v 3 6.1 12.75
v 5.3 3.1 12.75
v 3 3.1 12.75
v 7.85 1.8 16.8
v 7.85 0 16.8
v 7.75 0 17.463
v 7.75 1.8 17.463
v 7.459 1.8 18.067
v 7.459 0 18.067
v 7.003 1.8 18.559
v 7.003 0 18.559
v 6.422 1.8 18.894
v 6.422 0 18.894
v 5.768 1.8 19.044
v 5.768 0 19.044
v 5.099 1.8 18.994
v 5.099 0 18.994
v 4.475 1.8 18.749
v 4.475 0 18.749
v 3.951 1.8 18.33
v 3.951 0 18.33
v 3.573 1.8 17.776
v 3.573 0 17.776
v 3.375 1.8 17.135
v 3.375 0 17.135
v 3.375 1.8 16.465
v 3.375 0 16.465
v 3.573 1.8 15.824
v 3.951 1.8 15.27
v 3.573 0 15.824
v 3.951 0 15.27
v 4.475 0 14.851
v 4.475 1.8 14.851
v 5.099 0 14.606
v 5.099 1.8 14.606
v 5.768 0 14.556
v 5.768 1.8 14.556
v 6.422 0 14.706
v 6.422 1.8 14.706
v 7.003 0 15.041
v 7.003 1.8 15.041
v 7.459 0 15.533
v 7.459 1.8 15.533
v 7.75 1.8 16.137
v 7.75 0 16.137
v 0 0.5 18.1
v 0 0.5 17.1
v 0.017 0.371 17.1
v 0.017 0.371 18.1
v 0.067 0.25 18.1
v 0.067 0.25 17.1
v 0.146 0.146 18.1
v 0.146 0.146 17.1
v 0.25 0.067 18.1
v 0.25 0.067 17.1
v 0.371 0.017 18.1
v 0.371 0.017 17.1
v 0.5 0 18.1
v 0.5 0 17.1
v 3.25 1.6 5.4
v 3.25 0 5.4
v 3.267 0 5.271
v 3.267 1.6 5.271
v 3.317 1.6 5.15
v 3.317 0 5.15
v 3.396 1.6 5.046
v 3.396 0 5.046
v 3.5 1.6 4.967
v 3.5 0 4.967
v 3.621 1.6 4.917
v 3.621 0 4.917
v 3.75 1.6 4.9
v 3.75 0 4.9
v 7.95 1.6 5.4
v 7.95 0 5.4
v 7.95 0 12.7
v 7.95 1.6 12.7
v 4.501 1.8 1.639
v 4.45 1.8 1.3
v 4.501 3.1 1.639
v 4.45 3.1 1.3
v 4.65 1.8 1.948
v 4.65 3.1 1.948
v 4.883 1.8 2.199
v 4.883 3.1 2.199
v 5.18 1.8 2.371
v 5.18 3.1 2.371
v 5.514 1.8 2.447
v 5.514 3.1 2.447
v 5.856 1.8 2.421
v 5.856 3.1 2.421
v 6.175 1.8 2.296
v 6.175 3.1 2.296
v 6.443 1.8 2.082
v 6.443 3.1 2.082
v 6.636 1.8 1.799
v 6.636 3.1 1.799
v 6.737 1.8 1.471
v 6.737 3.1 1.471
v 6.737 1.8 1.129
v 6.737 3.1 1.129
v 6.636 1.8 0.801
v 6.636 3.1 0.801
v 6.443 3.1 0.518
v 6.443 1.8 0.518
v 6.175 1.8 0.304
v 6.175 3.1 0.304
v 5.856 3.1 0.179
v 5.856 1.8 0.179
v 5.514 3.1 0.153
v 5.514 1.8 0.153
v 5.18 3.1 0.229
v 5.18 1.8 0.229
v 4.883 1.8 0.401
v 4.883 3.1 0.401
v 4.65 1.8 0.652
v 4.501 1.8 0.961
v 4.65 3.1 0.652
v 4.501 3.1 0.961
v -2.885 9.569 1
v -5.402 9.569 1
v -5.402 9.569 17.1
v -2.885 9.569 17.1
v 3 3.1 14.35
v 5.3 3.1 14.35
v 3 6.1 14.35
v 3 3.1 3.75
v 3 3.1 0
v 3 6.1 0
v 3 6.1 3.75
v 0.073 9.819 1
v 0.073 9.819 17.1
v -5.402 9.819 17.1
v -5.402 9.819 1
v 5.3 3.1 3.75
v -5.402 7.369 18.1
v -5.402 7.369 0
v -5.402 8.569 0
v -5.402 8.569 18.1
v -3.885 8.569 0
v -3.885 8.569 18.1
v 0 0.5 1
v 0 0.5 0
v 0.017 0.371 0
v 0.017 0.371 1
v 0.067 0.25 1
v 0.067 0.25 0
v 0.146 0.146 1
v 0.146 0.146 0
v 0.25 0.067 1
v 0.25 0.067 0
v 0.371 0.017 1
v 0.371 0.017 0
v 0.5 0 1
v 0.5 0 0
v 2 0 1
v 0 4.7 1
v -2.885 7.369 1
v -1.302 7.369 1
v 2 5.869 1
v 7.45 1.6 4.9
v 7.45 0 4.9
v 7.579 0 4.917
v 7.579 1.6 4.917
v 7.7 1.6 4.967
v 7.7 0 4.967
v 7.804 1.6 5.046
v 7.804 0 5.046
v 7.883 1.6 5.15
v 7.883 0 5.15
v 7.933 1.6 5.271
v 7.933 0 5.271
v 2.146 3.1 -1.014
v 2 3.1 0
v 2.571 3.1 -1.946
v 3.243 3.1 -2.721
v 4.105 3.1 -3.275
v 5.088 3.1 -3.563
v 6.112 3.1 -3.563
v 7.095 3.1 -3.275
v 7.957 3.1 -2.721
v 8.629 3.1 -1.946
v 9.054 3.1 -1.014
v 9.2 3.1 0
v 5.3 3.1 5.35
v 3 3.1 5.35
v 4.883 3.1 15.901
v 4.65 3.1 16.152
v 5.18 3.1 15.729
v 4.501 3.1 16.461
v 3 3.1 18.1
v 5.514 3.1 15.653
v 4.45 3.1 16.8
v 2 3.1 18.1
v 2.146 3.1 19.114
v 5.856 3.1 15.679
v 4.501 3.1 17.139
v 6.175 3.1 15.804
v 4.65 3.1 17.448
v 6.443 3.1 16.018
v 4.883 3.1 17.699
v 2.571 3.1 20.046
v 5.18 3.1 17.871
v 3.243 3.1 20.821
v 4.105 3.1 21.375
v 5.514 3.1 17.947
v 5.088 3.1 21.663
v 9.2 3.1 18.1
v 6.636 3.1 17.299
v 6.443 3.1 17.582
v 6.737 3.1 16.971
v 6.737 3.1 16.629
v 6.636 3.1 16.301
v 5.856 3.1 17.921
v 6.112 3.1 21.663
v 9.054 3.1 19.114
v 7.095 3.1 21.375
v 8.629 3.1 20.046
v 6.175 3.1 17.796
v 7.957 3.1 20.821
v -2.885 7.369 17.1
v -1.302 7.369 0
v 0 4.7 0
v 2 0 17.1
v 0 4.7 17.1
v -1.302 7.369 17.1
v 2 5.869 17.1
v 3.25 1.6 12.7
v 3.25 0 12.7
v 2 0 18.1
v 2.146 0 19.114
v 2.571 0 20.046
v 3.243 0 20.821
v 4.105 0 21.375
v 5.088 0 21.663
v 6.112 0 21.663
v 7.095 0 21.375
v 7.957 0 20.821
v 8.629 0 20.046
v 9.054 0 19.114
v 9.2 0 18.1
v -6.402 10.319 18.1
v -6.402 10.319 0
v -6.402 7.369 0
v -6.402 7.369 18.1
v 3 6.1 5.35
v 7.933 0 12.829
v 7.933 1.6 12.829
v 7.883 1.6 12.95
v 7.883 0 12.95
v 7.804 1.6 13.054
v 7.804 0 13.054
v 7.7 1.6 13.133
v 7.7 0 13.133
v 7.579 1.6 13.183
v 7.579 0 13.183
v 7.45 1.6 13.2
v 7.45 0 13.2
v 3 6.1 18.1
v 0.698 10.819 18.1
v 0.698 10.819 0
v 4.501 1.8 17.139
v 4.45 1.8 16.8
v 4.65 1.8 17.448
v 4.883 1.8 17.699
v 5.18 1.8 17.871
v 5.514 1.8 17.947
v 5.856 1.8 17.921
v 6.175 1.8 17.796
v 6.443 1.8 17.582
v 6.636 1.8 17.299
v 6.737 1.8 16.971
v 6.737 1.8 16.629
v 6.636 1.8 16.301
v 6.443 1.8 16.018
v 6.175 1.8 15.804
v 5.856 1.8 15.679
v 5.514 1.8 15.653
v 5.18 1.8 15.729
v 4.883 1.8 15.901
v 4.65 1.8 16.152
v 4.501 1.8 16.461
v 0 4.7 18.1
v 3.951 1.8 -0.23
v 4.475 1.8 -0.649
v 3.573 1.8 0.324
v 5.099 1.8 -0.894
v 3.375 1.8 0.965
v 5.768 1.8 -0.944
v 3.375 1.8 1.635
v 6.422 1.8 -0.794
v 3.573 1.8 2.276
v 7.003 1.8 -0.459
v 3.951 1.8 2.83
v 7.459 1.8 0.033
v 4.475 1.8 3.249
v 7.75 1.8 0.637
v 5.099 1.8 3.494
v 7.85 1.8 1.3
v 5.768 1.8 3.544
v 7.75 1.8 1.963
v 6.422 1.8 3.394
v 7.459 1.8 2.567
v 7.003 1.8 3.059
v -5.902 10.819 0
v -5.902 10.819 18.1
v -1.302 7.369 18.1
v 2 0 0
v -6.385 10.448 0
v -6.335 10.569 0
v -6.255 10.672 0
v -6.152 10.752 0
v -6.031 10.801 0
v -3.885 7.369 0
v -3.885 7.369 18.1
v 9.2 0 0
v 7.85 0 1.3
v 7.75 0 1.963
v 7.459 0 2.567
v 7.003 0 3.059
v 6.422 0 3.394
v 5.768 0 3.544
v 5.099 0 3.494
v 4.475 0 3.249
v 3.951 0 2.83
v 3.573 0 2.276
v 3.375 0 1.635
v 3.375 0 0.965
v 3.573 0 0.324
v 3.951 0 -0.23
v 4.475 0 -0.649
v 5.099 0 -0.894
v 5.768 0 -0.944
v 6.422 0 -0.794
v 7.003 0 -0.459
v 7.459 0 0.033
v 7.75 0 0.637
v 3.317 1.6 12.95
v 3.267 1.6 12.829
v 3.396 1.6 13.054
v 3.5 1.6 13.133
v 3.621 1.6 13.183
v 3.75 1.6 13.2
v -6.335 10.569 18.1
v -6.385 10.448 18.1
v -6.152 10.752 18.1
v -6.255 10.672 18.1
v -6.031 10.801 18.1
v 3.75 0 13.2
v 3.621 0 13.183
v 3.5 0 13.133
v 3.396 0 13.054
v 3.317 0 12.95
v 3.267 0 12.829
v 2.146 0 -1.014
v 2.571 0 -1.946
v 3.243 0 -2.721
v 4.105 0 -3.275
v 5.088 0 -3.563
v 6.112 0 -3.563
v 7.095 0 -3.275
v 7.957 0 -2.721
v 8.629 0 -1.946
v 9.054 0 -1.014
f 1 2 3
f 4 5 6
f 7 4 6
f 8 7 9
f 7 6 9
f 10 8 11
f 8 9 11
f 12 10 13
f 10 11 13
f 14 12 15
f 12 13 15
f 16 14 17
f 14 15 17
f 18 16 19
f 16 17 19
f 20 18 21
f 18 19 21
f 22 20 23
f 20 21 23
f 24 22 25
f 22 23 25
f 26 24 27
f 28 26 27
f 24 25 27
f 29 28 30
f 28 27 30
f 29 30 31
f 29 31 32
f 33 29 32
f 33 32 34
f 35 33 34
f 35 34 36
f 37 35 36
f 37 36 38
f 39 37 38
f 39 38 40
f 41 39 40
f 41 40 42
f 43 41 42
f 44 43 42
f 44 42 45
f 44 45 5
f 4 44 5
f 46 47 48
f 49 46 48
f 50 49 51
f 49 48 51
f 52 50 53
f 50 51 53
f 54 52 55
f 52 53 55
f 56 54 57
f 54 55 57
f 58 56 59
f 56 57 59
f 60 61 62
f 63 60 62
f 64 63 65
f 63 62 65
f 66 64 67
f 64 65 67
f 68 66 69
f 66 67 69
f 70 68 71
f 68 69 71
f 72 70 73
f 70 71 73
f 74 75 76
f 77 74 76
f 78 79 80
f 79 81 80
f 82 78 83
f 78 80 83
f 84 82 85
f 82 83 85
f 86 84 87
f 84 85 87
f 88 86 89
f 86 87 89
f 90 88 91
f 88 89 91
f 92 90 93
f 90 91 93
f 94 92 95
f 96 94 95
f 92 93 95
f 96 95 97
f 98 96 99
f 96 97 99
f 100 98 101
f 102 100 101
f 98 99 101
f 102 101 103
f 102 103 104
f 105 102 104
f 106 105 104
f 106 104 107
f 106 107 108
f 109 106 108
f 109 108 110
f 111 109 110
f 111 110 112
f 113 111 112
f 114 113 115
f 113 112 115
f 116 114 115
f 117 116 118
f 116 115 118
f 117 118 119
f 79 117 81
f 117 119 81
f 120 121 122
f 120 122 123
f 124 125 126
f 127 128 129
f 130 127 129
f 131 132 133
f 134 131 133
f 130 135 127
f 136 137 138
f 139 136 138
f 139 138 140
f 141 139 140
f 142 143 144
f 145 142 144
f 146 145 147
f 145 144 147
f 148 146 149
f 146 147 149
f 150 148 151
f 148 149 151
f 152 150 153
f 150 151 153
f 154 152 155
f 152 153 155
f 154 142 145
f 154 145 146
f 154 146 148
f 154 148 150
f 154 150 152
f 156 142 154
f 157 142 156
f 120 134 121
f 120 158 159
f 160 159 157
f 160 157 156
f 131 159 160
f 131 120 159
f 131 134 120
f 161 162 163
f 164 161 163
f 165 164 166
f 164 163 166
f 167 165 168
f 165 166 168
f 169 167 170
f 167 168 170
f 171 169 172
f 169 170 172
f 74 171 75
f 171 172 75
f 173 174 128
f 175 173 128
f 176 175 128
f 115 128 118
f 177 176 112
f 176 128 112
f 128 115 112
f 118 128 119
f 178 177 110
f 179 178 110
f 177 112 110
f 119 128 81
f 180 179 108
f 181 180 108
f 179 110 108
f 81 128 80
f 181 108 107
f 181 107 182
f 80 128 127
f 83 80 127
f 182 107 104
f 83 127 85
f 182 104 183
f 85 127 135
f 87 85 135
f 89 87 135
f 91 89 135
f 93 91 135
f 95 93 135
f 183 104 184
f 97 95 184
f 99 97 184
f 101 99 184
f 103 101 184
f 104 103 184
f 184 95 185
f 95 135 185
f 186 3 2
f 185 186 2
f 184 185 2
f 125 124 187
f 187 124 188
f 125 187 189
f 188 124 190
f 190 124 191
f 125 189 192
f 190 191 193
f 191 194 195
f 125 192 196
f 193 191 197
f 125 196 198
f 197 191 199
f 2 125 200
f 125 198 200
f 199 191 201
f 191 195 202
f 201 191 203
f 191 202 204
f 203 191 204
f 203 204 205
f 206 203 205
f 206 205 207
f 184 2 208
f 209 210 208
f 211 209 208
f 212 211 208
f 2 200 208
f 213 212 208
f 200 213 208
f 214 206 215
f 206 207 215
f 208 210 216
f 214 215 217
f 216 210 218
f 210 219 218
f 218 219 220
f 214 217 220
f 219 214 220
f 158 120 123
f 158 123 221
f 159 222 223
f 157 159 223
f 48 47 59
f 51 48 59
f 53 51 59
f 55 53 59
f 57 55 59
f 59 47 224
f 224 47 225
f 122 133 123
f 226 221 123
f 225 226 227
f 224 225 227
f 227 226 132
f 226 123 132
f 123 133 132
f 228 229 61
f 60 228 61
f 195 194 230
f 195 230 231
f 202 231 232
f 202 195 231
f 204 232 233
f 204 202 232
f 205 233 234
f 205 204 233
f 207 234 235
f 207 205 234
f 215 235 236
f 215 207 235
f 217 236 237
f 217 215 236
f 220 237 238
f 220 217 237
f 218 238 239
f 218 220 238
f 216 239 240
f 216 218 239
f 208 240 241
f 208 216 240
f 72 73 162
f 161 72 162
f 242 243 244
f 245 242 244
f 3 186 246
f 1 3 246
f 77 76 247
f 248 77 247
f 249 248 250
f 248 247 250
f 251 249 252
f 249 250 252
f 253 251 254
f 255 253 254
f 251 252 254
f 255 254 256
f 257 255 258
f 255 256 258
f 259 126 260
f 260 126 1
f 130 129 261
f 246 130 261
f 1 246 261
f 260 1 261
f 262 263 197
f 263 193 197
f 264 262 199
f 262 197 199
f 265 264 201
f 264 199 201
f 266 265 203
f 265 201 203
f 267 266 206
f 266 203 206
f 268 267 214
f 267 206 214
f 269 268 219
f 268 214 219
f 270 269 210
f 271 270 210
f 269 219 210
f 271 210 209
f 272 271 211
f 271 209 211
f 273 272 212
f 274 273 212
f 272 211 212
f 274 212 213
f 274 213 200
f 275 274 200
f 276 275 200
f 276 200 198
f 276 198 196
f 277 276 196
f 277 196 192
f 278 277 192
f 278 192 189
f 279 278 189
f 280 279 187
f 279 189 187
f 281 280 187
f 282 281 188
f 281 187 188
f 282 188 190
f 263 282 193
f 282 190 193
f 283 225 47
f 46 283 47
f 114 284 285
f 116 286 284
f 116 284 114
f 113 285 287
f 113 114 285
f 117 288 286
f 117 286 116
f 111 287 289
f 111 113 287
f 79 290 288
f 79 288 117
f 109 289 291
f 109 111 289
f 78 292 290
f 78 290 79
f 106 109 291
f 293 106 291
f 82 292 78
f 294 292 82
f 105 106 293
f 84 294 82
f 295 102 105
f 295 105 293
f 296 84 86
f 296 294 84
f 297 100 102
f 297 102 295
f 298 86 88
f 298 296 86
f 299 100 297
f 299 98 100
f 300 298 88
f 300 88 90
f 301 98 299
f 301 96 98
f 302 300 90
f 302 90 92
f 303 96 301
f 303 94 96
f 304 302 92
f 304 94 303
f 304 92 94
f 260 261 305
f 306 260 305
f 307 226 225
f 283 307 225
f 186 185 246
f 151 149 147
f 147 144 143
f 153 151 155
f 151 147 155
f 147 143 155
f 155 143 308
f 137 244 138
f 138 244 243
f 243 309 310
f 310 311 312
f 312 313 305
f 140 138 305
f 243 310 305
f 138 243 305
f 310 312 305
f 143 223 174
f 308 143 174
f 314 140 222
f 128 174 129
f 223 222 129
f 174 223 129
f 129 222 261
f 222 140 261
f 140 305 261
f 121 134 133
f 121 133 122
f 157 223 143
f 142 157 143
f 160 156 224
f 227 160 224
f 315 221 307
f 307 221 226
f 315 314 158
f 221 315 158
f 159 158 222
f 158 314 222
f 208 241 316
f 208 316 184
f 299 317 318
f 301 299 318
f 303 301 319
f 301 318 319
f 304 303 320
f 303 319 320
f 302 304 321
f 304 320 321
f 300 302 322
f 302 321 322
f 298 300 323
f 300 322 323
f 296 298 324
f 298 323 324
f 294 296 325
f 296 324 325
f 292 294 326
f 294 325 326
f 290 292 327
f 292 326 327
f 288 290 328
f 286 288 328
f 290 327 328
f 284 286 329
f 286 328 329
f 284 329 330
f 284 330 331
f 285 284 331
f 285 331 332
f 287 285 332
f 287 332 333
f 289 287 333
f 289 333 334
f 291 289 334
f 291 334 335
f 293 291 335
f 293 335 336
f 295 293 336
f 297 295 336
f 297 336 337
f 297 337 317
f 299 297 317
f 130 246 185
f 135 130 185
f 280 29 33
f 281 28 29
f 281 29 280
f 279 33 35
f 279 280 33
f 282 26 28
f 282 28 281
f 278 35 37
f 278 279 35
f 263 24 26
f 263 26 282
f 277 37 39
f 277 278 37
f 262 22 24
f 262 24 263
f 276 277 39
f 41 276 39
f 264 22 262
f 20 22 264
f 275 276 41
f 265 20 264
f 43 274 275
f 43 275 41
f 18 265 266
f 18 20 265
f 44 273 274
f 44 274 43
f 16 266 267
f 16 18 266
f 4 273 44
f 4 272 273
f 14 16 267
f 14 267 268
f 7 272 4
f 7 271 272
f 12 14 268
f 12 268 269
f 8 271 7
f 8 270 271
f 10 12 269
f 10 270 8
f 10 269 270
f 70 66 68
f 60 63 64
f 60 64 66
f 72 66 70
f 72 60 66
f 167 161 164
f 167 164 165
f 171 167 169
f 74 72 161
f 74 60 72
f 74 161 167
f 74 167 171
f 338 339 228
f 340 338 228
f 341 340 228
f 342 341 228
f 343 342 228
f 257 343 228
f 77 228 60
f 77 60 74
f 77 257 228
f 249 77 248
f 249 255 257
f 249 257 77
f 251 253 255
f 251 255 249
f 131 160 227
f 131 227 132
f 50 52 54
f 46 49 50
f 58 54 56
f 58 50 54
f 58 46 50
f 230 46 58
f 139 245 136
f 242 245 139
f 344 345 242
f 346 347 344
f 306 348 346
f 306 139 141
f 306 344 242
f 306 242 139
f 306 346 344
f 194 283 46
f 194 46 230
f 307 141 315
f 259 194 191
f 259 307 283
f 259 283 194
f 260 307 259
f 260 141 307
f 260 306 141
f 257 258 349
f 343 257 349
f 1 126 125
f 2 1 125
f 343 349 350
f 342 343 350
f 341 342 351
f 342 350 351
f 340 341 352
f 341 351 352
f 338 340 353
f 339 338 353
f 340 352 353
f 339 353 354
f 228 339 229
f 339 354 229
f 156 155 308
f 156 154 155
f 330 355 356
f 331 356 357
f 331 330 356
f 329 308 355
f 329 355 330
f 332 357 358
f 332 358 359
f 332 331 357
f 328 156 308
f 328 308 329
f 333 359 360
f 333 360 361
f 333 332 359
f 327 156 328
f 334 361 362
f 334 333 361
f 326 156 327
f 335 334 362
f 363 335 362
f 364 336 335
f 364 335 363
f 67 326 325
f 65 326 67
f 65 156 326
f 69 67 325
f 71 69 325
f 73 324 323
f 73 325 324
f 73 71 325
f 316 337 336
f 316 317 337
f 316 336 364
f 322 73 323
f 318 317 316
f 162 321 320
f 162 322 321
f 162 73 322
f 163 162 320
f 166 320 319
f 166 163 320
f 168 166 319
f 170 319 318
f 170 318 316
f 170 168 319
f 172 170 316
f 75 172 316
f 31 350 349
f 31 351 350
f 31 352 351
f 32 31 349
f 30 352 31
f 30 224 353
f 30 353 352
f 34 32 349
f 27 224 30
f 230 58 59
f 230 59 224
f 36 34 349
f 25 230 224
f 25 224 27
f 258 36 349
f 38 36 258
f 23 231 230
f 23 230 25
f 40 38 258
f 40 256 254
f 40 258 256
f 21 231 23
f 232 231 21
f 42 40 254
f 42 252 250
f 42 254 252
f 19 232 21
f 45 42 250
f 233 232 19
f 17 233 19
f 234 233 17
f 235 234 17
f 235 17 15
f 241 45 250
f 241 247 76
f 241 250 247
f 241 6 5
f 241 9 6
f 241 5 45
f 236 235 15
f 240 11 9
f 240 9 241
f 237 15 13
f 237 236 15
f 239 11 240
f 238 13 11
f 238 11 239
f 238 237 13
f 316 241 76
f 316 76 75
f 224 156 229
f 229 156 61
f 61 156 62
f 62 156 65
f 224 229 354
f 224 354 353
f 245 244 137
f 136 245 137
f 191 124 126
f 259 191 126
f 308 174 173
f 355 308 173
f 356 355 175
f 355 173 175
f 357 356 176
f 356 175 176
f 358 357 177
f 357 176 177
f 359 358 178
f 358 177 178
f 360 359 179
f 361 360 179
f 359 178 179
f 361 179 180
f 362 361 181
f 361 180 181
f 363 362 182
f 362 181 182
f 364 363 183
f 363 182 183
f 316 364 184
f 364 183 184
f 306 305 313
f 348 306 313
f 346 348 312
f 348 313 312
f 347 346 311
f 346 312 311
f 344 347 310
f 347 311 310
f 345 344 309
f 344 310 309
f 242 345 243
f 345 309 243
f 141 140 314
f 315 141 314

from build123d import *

# Parameters (mm, degrees)
EXTRUSION1_DEPTH                                  = 18.1
COQUE1_START                                      = 1
COQUE1_DEPTH                                      = 16.1
EXTRUSION2_DEPTH                                  = 3.1
ESQUISSE3_W                                       = 6.2
ESQUISSE3_H                                       = 18.1
EXTRUSION3_DEPTH                                  = 2.1
CHAMBRAGE_POUR_VIS_T_TE_HEXAGONALE_M2_D           = 2.3
CHAMBRAGE_POUR_VIS_T_TE_HEXAGONALE_M2_CBORE_D     = 4.5
CHAMBRAGE_POUR_VIS_T_TE_HEXAGONALE_M2_CBORE_DEPTH = 1.8
ENL_V_MAT_EXTRU_1_DEPTH                           = 1.6
EXTRUSION4_DEPTH                                  = 1.6
R_P_TITION_LIN_AIRE1_COUNT                        = 2
R_P_TITION_LIN_AIRE1_PITCH                        = 9


# Read off the part's stored shape, not the designer's step: Coque1
with BuildPart() as part:
    # Esquisse1 → Extrusion1 (new body)
    with BuildSketch(Plane.XY):
        with BuildLine():
            Line((0.5, 0), (9.2, 0))
            Line((9.2, 0), (9.2, 3.1))
            Line((9.2, 3.1), (3, 3.1))
            Line((3, 3.1), (3, 6.1))
            Line((3, 6.1), (0.698275932, 10.81853434))
            Line((0.698275932, 10.81853434), (-5.901724068, 10.81853434))
            ThreePointArc((-5.901724068, 10.81853434), (-6.255277459, 10.67208773), (-6.401724068, 10.31853434))
            Line((-6.401724068, 10.31853434), (-6.401724068, 7.36853434))
            Line((-6.401724068, 7.36853434), (-5.401724068, 7.36853434))
            Line((-5.401724068, 7.36853434), (-5.401724068, 8.56853434))
            Line((-5.401724068, 8.56853434), (-3.884726415, 8.56853434))
            Line((-3.884726415, 8.56853434), (-3.884726415, 7.36853434))
            Line((-3.884726415, 7.36853434), (-1.301724068, 7.36853434))
            Line((-1.301724068, 7.36853434), (0, 4.7))
            Line((0, 4.7), (0, 0.5))
            ThreePointArc((0, 0.5), (0.146446609, 0.146446609), (0.5, 0))
        make_face()
    extrude(amount=EXTRUSION1_DEPTH)

    # Coque1 outline → Coque1 (cut)
    with BuildSketch(Plane.XY.offset(COQUE1_START)):
        with BuildLine():
            Line((-5.401724068, 9.81853434), (-5.401724068, 9.56853434))
            Line((-5.401724068, 9.56853434), (-2.884726415, 9.56853434))
            Line((-2.884726415, 9.56853434), (-2.884726415, 7.36853434))
            Line((-2.884726415, 7.36853434), (-1.301724068, 7.36853434))
            Line((-1.301724068, 7.36853434), (0, 4.7))
            Line((0, 4.7), (0, 0.5))
            ThreePointArc((0, 0.5), (0.146446609, 0.146446609), (0.5, 0))
            Line((0.5, 0), (8.2, 0))
            Line((8.2, 0), (8.2, 2.1))
            Line((8.2, 2.1), (2, 2.1))
            Line((2, 2.1), (2, 5.869101054))
            Line((2, 5.869101054), (0.073447178, 9.81853434))
            Line((0.073447178, 9.81853434), (-5.401724068, 9.81853434))
        make_face()
    extrude(amount=COQUE1_DEPTH, mode=Mode.SUBTRACT)

    # Esquisse2 → Extrusion2 (add)
    with BuildSketch(Plane(origin=(0, 3.1, 0), x_dir=(-1, 0, 0), z_dir=(0, 1, 0))):
        with BuildLine():
            Line((-9.2, 0), (-2, 0))
            ThreePointArc((-2, 0), (-5.6, -3.6), (-9.2, 0))
        make_face()
        with BuildLine():
            Line((-9.2, 18.1), (-2, 18.1))
            ThreePointArc((-2, 18.1), (-5.6, 21.7), (-9.2, 18.1))
        make_face()
    extrude(amount=-EXTRUSION2_DEPTH)

    # Esquisse3 → Extrusion3 (add)
    with BuildSketch(Plane.XZ):
        with Locations((5.1, 9.05)):
            Rectangle(ESQUISSE3_W, ESQUISSE3_H)
    extrude(amount=-EXTRUSION3_DEPTH)

    # Chambrage pour vis à tête hexagonale M2.51 (through all)
    with Locations(Plane.XZ):
        with Locations((5.6, 1.3), (5.6, 16.8)):
            CounterBoreHole(CHAMBRAGE_POUR_VIS_T_TE_HEXAGONALE_M2_D / 2, CHAMBRAGE_POUR_VIS_T_TE_HEXAGONALE_M2_CBORE_D / 2, CHAMBRAGE_POUR_VIS_T_TE_HEXAGONALE_M2_CBORE_DEPTH)

    # Esquisse6 → Enlèv. mat.-Extru.1 (cut)
    with BuildSketch(Plane.XZ):
        with BuildLine():
            Line((3.75, 4.9), (7.45, 4.9))
            ThreePointArc((7.45, 4.9), (7.803553391, 5.046446609), (7.95, 5.4))
            Line((7.95, 5.4), (7.95, 12.7))
            ThreePointArc((7.95, 12.7), (7.803553391, 13.053553391), (7.45, 13.2))
            Line((7.45, 13.2), (3.75, 13.2))
            ThreePointArc((3.75, 13.2), (3.396446609, 13.053553391), (3.25, 12.7))
            Line((3.25, 12.7), (3.25, 5.4))
            ThreePointArc((3.25, 5.4), (3.396446609, 5.046446609), (3.75, 4.9))
        make_face()
    extrude(amount=-ENL_V_MAT_EXTRU_1_DEPTH, mode=Mode.SUBTRACT)

    # Esquisse7 → Extrusion4 (add)
    with BuildSketch(Plane.XY.offset(14.35)):
        Polygon((3, 6.1), (5.3, 3.1), (3, 3.1), align=None)
    extrusion4 = extrude(amount=-EXTRUSION4_DEPTH)

    # Répétition linéaire1: Extrusion4 ×2
    with Locations(*[(0, 0, -i * R_P_TITION_LIN_AIRE1_PITCH) for i in range(1, R_P_TITION_LIN_AIRE1_COUNT)]):
        add(extrusion4)


solid = part.part
